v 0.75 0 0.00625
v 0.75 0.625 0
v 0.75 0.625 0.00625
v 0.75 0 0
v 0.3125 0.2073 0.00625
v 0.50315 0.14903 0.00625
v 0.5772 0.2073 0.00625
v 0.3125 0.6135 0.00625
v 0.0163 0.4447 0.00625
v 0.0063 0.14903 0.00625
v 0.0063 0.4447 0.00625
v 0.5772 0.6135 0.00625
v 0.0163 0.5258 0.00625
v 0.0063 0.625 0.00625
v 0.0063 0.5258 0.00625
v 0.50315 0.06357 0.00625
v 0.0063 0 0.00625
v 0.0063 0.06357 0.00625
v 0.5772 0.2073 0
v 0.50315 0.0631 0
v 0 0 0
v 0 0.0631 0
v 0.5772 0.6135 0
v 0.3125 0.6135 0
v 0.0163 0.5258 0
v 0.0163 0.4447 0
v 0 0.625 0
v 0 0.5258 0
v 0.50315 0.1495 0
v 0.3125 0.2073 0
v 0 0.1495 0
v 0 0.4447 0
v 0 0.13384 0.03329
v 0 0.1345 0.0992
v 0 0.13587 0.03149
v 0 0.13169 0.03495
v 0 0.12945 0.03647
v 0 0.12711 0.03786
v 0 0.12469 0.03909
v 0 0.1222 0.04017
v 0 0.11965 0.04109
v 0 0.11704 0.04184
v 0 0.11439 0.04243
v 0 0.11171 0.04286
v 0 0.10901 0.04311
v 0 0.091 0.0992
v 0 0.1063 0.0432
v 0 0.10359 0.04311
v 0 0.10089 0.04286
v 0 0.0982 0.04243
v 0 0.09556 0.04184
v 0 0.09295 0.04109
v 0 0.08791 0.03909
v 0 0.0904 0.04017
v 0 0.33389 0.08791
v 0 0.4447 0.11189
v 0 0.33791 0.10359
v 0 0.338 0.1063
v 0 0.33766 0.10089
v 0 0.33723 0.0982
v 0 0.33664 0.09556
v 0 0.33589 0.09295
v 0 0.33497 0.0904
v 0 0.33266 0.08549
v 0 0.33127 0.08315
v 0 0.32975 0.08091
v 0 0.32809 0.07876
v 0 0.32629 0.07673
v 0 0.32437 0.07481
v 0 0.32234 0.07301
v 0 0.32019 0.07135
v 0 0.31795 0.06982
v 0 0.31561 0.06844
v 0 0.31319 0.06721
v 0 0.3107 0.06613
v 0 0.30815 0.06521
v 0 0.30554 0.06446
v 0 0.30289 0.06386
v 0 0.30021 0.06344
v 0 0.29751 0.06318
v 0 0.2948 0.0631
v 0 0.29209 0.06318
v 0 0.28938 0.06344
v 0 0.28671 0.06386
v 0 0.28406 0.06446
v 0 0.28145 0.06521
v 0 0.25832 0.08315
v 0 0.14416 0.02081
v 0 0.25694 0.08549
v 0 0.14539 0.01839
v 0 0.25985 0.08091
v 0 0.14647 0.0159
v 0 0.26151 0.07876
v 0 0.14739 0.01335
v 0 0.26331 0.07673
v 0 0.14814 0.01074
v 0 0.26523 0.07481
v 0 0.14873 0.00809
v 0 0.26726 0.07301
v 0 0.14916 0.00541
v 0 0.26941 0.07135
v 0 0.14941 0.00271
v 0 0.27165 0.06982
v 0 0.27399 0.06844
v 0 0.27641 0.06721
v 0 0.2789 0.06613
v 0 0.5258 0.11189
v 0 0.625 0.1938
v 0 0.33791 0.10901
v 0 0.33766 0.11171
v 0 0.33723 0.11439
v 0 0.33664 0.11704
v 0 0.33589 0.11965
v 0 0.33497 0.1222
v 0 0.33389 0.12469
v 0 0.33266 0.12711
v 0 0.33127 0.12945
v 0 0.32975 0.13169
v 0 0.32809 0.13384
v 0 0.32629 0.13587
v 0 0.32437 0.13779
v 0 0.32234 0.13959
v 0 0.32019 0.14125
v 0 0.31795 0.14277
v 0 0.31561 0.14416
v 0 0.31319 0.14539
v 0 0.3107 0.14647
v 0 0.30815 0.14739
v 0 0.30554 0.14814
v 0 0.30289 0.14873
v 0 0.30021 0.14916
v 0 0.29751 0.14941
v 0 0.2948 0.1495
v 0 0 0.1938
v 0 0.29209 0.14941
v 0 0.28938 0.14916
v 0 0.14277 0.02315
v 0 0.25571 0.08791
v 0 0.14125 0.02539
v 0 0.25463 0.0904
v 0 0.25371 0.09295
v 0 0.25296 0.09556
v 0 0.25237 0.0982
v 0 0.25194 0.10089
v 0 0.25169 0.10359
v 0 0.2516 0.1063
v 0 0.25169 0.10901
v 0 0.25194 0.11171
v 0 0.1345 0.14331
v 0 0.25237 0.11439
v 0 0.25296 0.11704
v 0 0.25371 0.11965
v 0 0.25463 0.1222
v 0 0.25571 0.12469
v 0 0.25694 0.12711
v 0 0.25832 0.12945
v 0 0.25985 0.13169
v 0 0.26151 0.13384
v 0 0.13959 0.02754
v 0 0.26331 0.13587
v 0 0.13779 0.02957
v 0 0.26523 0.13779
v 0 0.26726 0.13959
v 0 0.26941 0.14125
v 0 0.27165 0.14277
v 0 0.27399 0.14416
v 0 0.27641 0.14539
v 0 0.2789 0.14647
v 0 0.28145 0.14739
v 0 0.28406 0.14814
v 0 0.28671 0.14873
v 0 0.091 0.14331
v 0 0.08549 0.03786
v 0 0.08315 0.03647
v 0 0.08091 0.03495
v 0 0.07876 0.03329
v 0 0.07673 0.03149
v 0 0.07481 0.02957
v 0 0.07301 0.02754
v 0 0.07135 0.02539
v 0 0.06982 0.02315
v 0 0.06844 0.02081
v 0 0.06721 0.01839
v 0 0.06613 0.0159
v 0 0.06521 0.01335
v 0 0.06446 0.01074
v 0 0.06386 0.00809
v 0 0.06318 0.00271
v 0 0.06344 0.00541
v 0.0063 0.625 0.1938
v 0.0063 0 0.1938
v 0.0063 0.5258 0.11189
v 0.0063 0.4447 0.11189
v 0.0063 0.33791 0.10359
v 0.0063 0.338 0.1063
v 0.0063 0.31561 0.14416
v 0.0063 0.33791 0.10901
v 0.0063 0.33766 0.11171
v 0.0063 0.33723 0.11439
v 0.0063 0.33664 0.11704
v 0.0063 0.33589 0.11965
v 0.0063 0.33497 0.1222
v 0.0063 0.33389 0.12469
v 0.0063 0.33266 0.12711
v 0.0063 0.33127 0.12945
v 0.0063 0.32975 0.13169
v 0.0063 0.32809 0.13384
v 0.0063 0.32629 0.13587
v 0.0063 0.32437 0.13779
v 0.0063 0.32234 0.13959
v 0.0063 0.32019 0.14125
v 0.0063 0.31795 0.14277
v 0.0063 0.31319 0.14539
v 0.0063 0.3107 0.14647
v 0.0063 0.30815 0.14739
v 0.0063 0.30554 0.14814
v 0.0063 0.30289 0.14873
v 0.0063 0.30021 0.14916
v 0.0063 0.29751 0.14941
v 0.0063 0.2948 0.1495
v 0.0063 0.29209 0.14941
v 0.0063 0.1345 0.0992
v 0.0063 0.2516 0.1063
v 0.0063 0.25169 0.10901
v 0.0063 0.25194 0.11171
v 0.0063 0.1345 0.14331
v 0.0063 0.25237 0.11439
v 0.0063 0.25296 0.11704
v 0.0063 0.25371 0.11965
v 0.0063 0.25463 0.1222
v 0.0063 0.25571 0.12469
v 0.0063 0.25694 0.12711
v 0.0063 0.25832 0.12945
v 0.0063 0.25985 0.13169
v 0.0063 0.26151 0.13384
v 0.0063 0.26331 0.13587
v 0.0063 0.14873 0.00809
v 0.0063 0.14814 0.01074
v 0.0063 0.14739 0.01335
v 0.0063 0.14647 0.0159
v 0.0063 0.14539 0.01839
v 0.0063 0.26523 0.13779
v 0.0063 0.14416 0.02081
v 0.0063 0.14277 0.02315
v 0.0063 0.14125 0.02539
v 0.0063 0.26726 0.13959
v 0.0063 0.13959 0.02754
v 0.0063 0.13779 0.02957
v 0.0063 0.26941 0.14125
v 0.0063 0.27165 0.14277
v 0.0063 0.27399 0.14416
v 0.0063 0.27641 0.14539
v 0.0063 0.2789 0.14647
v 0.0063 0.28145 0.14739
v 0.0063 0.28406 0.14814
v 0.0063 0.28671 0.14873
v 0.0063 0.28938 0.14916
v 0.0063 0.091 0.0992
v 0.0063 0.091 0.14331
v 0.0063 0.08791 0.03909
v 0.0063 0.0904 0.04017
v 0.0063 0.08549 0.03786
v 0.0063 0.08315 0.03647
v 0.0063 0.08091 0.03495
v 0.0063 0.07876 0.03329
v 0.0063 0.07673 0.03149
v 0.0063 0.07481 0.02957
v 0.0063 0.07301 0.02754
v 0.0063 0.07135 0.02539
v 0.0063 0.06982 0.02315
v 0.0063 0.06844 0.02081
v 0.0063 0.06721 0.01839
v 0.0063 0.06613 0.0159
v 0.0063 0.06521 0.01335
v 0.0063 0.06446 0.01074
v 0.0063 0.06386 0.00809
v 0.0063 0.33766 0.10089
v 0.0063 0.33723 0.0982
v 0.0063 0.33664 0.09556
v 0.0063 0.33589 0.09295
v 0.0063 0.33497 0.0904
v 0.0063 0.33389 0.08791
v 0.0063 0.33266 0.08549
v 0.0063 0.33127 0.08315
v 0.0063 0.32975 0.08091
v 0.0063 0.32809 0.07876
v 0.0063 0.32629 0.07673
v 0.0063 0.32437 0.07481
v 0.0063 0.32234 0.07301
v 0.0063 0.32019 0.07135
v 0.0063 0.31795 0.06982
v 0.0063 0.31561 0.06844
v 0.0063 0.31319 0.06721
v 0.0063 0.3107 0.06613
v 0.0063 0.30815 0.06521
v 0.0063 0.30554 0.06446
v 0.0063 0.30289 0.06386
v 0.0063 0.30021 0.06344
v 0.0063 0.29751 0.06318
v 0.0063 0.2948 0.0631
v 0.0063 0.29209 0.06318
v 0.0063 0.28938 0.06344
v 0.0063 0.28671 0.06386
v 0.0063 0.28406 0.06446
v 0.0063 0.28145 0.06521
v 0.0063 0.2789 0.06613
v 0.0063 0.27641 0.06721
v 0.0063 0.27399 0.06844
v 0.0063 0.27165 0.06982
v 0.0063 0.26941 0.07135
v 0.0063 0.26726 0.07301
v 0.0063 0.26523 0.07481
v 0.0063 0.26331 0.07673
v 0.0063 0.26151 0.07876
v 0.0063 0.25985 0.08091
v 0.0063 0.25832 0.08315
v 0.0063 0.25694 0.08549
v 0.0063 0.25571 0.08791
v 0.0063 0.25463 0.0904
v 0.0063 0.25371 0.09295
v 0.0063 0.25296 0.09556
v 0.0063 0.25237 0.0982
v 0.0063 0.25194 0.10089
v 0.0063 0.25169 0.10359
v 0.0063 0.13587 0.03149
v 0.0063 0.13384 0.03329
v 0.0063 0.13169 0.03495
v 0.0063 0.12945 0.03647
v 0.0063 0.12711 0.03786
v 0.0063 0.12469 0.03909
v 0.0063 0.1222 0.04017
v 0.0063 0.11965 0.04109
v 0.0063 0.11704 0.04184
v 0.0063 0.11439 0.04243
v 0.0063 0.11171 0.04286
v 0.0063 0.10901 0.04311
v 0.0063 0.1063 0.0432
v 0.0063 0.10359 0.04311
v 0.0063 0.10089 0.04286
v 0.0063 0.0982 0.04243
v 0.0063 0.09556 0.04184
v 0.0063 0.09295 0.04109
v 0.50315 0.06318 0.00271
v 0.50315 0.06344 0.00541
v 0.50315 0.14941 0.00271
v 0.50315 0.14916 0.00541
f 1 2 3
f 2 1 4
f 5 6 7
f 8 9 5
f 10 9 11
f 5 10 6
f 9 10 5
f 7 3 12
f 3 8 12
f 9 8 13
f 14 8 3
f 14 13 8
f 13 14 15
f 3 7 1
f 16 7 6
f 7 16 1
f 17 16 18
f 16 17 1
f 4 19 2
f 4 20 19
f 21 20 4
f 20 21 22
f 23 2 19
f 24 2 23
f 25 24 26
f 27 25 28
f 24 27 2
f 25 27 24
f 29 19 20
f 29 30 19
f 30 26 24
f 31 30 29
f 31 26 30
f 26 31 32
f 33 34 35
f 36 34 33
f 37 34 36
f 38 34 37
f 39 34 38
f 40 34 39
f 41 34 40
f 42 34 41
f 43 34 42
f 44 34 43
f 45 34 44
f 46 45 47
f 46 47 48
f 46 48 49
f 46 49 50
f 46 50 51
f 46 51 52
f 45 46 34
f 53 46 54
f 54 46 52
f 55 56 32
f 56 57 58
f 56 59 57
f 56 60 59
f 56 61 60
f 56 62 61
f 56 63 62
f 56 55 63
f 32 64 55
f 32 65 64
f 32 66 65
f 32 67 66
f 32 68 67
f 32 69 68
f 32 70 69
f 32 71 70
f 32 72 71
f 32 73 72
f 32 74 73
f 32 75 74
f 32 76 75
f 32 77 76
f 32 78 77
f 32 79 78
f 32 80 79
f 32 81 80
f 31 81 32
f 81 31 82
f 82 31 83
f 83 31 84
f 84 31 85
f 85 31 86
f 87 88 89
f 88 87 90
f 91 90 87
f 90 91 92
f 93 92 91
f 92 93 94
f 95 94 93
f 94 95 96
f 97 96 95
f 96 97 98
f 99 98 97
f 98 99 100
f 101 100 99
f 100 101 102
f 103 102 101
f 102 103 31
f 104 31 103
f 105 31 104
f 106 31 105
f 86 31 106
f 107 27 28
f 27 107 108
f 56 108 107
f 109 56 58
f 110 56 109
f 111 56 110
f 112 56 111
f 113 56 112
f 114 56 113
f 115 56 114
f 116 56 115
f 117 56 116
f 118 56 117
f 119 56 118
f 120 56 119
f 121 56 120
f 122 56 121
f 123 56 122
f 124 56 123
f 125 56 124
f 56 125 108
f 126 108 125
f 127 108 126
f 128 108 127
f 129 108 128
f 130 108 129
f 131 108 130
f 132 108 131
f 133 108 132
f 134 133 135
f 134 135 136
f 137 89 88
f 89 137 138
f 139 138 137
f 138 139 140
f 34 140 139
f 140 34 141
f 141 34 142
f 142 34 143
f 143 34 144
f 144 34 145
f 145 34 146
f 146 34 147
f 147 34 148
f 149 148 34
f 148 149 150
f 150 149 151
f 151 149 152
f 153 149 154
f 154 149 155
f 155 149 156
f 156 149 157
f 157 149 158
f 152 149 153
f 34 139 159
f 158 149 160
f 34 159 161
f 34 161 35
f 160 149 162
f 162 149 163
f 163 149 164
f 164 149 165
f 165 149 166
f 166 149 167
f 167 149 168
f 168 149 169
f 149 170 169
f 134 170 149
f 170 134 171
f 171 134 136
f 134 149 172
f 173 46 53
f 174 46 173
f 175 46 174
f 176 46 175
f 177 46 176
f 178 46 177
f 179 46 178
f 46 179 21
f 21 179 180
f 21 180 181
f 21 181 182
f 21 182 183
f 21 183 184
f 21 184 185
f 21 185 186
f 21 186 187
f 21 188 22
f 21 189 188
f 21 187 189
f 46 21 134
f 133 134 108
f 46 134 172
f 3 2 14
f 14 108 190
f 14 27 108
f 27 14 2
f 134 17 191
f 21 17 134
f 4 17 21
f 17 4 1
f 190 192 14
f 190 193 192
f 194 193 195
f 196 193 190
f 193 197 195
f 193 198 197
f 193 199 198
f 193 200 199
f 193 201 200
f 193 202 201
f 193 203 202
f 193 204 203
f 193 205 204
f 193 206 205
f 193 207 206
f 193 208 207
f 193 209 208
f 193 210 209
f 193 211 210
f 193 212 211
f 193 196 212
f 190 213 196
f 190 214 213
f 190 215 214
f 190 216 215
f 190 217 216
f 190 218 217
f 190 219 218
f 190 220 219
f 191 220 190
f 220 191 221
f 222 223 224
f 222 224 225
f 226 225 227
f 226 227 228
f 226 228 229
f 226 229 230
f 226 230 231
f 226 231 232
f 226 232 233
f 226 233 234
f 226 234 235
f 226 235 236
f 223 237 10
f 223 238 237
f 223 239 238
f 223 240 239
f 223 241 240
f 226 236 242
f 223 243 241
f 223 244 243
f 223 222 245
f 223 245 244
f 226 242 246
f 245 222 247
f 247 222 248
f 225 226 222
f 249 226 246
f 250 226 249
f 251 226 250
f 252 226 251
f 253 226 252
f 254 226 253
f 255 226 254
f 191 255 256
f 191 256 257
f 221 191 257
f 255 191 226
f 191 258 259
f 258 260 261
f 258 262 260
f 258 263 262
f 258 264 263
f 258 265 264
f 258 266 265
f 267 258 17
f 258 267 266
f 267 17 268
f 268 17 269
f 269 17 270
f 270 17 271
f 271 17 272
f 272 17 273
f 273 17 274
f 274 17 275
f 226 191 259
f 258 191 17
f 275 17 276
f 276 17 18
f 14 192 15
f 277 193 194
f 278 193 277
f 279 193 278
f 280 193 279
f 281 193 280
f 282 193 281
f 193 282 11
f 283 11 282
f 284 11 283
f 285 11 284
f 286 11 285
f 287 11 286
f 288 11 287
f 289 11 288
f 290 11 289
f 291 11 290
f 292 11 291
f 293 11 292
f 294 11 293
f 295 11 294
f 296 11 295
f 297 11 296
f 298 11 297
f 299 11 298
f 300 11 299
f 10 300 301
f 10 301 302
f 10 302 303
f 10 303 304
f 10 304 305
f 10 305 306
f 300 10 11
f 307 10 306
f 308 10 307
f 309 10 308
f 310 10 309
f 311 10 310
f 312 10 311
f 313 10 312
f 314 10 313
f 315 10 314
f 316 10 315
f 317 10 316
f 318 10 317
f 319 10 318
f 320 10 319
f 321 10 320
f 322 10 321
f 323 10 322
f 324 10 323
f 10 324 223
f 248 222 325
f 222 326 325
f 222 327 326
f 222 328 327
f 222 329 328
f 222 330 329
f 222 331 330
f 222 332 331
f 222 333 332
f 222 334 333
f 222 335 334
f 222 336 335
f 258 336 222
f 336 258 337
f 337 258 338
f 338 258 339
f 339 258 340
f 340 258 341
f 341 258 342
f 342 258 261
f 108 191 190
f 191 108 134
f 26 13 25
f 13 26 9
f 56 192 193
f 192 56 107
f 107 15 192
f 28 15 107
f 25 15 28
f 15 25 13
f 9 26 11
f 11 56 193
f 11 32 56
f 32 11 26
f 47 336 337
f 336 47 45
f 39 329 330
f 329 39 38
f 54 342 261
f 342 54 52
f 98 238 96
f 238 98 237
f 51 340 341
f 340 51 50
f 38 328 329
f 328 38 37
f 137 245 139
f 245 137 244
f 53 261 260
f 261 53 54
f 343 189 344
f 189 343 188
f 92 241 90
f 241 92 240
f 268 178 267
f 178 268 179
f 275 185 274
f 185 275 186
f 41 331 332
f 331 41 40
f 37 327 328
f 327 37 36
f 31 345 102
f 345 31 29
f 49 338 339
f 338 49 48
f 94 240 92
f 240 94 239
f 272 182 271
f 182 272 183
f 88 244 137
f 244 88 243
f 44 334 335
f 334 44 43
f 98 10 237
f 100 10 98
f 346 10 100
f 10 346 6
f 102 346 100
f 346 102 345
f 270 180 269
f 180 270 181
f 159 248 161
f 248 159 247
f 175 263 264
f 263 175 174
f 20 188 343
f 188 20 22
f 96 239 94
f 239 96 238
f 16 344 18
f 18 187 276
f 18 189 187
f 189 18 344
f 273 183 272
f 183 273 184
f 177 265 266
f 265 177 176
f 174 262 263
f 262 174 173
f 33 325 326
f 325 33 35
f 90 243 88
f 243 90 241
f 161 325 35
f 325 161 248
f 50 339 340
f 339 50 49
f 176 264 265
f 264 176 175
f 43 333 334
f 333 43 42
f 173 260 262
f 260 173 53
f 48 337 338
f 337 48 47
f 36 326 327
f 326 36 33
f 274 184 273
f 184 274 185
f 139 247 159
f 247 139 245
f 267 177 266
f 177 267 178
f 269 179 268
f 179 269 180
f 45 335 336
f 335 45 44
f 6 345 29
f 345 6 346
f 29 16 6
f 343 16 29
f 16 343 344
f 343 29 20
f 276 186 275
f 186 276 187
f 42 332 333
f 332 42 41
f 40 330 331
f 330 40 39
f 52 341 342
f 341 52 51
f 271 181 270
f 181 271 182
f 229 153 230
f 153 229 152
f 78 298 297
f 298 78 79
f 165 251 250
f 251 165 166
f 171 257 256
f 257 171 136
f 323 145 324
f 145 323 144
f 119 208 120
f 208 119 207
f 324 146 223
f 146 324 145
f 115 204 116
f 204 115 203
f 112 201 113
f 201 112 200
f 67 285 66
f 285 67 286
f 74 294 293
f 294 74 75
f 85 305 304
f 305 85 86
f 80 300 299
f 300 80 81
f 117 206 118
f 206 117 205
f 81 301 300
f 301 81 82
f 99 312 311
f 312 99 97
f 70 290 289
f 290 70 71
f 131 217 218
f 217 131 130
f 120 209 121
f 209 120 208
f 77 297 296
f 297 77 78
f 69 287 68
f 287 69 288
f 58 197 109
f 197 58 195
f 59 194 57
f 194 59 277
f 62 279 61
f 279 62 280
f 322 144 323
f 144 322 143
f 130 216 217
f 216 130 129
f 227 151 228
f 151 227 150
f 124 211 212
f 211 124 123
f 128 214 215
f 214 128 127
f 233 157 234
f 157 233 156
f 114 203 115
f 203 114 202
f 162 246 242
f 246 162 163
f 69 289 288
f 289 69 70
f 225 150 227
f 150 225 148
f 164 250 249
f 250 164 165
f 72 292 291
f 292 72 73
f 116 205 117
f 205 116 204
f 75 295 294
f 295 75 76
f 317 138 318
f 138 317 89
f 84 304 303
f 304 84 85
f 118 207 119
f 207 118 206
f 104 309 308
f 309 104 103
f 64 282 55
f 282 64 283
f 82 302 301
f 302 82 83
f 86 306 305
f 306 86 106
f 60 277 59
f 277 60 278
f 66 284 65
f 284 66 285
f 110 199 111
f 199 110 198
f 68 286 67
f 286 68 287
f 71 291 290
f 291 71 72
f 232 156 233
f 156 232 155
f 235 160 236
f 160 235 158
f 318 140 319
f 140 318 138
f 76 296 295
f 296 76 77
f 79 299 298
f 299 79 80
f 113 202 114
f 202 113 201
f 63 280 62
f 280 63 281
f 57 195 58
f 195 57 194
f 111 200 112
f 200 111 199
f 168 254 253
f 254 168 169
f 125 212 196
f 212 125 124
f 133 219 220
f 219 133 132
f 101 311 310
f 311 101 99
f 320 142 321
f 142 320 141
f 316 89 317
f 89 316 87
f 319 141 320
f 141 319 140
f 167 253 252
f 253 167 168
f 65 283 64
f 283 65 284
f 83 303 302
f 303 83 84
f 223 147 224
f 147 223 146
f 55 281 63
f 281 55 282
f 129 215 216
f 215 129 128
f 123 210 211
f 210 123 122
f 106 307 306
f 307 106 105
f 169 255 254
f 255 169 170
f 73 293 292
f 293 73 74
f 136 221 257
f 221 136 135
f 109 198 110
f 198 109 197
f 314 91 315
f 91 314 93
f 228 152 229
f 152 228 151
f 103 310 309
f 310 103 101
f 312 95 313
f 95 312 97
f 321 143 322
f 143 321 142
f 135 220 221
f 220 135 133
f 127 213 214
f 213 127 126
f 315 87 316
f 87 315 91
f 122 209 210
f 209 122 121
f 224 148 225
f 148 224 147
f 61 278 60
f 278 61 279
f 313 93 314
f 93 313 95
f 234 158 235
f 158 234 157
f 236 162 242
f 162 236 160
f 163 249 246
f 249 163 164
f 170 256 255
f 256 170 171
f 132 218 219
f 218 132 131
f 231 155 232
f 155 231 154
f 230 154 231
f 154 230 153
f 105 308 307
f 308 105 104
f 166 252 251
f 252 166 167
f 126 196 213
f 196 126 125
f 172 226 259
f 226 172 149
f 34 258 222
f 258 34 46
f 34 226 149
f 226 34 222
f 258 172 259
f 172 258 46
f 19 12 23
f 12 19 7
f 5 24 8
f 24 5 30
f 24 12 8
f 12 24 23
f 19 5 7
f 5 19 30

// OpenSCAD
// Parameters
base_length = 0.75;
base_width = 0.625;
base_height = 0.00625;          // plate thickness
base_bottom_z = 0;

wall_thickness = 0.0063;        // x-dimension of upright wall
wall_top_z = 0.1938;            // total height from base underside

// --- First rectangular opening in wall ---
rect1_y_len = 0.081103;
rect1_z_len = 0.111891;
rect1_front_offset = 0.4447;    // from front edge (y=0)
rect1_back_offset = 0.0992;     // from back edge
rect1_z_min = 0;
rect1_z_max = rect1_z_min + rect1_z_len;
rect1_cut_reach = 0.0062;       // x-depth of cut

// --- Circular hole in wall ---
circ_radius = 0.0432;
circ_front_offset = 0.2948;     // y-coordinate of axis
circ_z_min = 0.0631;
circ_z_max = 0.1495;
circ_cut_reach = 0.0625;        // x-depth of cut

// --- Second rectangular opening in wall ---
rect2_y_len = 0.043521;
rect2_z_len = 0.044108;
rect2_front_offset = 0.091;
rect2_back_offset = 0.4905;
rect2_z_min = 0.0992;
rect2_z_max = rect2_z_min + rect2_z_len;
rect2_cut_reach = 0.0625;

// --- Base cutout ---
base_cut_x_len = 0.264669;
base_cut_y_len = 0.40625;
base_cut_left_offset = 0.3125;  // from left edge (x=0)
base_cut_right_offset = 0.1728; // from right edge
base_cut_front_offset = 0.2073; // from front edge (y=0)
base_cut_back_offset = 0.0115;  // from back edge
base_cut_z_min = -0.0562;       // relative to base underside
base_cut_z_max = 0.0063;

// Computed positions and dimensions
wall_x_min = 0;
wall_x_max = wall_thickness;
wall_y_min = 0;
wall_y_max = base_width;
wall_z_min = base_bottom_z;
wall_z_max = wall_top_z;

// First rectangle cut
rect1_y_min = rect1_front_offset;
rect1_y_max = base_width - rect1_back_offset;
rect1_x_cut = rect1_cut_reach;   // x-length of subtracting box (centered on wall)

// Circular hole: axis at x=0 (left offset)
circ_center_y = circ_front_offset;
circ_center_z = (circ_z_min + circ_z_max) / 2;
circ_hole_len = circ_cut_reach;  // length along x, but we'll use oversized

// Second rectangle cut
rect2_y_min = rect2_front_offset;
rect2_y_max = base_width - rect2_back_offset;
rect2_x_cut = rect2_cut_reach;

// Base cut
base_cut_x_min = base_cut_left_offset;
base_cut_x_max = base_length - base_cut_right_offset;
base_cut_y_min = base_cut_front_offset;
base_cut_y_max = base_width - base_cut_back_offset;

// Modules
module baseplate() {
    cube([base_length, base_width, base_height]);
}

module wall() {
    cube([wall_thickness, base_width, wall_top_z]);
}

// Main model
difference() {
    union() {
        baseplate();
        wall();
    }

    // --- Wall openings ---

    // First rectangular opening
    // Overshoot in x to guarantee through cut
    translate([wall_x_min - 0.01, rect1_y_min, rect1_z_min])
        cube([wall_thickness + 0.02, rect1_y_max - rect1_y_min, rect1_z_max - rect1_z_min]);

    // Circular hole
    rotate([0, 90, 0])
        translate([0, circ_center_z - base_bottom_z - wall_z_min, 0]) // align center
            cylinder(h = wall_thickness + 1, r = circ_radius, center = true);
    // More accurate placement:
    translate([wall_x_min, circ_center_y, circ_center_z])
        rotate([0, 90, 0])
            cylinder(h = wall_thickness + 1, r = circ_radius, center = true);

    // Second rectangular opening
    translate([wall_x_min - 0.01, rect2_y_min, rect2_z_min])
        cube([wall_thickness + 0.02, rect2_y_max - rect2_y_min, rect2_z_max - rect2_z_min]);

    // --- Base cutout ---
    translate([base_cut_x_min, base_cut_y_min, base_cut_z_min])
        cube([base_cut_x_max - base_cut_x_min, base_cut_y_max - base_cut_y_min, base_cut_z_max - base_cut_z_min]);
}

// Resolution
$fn = 100;
